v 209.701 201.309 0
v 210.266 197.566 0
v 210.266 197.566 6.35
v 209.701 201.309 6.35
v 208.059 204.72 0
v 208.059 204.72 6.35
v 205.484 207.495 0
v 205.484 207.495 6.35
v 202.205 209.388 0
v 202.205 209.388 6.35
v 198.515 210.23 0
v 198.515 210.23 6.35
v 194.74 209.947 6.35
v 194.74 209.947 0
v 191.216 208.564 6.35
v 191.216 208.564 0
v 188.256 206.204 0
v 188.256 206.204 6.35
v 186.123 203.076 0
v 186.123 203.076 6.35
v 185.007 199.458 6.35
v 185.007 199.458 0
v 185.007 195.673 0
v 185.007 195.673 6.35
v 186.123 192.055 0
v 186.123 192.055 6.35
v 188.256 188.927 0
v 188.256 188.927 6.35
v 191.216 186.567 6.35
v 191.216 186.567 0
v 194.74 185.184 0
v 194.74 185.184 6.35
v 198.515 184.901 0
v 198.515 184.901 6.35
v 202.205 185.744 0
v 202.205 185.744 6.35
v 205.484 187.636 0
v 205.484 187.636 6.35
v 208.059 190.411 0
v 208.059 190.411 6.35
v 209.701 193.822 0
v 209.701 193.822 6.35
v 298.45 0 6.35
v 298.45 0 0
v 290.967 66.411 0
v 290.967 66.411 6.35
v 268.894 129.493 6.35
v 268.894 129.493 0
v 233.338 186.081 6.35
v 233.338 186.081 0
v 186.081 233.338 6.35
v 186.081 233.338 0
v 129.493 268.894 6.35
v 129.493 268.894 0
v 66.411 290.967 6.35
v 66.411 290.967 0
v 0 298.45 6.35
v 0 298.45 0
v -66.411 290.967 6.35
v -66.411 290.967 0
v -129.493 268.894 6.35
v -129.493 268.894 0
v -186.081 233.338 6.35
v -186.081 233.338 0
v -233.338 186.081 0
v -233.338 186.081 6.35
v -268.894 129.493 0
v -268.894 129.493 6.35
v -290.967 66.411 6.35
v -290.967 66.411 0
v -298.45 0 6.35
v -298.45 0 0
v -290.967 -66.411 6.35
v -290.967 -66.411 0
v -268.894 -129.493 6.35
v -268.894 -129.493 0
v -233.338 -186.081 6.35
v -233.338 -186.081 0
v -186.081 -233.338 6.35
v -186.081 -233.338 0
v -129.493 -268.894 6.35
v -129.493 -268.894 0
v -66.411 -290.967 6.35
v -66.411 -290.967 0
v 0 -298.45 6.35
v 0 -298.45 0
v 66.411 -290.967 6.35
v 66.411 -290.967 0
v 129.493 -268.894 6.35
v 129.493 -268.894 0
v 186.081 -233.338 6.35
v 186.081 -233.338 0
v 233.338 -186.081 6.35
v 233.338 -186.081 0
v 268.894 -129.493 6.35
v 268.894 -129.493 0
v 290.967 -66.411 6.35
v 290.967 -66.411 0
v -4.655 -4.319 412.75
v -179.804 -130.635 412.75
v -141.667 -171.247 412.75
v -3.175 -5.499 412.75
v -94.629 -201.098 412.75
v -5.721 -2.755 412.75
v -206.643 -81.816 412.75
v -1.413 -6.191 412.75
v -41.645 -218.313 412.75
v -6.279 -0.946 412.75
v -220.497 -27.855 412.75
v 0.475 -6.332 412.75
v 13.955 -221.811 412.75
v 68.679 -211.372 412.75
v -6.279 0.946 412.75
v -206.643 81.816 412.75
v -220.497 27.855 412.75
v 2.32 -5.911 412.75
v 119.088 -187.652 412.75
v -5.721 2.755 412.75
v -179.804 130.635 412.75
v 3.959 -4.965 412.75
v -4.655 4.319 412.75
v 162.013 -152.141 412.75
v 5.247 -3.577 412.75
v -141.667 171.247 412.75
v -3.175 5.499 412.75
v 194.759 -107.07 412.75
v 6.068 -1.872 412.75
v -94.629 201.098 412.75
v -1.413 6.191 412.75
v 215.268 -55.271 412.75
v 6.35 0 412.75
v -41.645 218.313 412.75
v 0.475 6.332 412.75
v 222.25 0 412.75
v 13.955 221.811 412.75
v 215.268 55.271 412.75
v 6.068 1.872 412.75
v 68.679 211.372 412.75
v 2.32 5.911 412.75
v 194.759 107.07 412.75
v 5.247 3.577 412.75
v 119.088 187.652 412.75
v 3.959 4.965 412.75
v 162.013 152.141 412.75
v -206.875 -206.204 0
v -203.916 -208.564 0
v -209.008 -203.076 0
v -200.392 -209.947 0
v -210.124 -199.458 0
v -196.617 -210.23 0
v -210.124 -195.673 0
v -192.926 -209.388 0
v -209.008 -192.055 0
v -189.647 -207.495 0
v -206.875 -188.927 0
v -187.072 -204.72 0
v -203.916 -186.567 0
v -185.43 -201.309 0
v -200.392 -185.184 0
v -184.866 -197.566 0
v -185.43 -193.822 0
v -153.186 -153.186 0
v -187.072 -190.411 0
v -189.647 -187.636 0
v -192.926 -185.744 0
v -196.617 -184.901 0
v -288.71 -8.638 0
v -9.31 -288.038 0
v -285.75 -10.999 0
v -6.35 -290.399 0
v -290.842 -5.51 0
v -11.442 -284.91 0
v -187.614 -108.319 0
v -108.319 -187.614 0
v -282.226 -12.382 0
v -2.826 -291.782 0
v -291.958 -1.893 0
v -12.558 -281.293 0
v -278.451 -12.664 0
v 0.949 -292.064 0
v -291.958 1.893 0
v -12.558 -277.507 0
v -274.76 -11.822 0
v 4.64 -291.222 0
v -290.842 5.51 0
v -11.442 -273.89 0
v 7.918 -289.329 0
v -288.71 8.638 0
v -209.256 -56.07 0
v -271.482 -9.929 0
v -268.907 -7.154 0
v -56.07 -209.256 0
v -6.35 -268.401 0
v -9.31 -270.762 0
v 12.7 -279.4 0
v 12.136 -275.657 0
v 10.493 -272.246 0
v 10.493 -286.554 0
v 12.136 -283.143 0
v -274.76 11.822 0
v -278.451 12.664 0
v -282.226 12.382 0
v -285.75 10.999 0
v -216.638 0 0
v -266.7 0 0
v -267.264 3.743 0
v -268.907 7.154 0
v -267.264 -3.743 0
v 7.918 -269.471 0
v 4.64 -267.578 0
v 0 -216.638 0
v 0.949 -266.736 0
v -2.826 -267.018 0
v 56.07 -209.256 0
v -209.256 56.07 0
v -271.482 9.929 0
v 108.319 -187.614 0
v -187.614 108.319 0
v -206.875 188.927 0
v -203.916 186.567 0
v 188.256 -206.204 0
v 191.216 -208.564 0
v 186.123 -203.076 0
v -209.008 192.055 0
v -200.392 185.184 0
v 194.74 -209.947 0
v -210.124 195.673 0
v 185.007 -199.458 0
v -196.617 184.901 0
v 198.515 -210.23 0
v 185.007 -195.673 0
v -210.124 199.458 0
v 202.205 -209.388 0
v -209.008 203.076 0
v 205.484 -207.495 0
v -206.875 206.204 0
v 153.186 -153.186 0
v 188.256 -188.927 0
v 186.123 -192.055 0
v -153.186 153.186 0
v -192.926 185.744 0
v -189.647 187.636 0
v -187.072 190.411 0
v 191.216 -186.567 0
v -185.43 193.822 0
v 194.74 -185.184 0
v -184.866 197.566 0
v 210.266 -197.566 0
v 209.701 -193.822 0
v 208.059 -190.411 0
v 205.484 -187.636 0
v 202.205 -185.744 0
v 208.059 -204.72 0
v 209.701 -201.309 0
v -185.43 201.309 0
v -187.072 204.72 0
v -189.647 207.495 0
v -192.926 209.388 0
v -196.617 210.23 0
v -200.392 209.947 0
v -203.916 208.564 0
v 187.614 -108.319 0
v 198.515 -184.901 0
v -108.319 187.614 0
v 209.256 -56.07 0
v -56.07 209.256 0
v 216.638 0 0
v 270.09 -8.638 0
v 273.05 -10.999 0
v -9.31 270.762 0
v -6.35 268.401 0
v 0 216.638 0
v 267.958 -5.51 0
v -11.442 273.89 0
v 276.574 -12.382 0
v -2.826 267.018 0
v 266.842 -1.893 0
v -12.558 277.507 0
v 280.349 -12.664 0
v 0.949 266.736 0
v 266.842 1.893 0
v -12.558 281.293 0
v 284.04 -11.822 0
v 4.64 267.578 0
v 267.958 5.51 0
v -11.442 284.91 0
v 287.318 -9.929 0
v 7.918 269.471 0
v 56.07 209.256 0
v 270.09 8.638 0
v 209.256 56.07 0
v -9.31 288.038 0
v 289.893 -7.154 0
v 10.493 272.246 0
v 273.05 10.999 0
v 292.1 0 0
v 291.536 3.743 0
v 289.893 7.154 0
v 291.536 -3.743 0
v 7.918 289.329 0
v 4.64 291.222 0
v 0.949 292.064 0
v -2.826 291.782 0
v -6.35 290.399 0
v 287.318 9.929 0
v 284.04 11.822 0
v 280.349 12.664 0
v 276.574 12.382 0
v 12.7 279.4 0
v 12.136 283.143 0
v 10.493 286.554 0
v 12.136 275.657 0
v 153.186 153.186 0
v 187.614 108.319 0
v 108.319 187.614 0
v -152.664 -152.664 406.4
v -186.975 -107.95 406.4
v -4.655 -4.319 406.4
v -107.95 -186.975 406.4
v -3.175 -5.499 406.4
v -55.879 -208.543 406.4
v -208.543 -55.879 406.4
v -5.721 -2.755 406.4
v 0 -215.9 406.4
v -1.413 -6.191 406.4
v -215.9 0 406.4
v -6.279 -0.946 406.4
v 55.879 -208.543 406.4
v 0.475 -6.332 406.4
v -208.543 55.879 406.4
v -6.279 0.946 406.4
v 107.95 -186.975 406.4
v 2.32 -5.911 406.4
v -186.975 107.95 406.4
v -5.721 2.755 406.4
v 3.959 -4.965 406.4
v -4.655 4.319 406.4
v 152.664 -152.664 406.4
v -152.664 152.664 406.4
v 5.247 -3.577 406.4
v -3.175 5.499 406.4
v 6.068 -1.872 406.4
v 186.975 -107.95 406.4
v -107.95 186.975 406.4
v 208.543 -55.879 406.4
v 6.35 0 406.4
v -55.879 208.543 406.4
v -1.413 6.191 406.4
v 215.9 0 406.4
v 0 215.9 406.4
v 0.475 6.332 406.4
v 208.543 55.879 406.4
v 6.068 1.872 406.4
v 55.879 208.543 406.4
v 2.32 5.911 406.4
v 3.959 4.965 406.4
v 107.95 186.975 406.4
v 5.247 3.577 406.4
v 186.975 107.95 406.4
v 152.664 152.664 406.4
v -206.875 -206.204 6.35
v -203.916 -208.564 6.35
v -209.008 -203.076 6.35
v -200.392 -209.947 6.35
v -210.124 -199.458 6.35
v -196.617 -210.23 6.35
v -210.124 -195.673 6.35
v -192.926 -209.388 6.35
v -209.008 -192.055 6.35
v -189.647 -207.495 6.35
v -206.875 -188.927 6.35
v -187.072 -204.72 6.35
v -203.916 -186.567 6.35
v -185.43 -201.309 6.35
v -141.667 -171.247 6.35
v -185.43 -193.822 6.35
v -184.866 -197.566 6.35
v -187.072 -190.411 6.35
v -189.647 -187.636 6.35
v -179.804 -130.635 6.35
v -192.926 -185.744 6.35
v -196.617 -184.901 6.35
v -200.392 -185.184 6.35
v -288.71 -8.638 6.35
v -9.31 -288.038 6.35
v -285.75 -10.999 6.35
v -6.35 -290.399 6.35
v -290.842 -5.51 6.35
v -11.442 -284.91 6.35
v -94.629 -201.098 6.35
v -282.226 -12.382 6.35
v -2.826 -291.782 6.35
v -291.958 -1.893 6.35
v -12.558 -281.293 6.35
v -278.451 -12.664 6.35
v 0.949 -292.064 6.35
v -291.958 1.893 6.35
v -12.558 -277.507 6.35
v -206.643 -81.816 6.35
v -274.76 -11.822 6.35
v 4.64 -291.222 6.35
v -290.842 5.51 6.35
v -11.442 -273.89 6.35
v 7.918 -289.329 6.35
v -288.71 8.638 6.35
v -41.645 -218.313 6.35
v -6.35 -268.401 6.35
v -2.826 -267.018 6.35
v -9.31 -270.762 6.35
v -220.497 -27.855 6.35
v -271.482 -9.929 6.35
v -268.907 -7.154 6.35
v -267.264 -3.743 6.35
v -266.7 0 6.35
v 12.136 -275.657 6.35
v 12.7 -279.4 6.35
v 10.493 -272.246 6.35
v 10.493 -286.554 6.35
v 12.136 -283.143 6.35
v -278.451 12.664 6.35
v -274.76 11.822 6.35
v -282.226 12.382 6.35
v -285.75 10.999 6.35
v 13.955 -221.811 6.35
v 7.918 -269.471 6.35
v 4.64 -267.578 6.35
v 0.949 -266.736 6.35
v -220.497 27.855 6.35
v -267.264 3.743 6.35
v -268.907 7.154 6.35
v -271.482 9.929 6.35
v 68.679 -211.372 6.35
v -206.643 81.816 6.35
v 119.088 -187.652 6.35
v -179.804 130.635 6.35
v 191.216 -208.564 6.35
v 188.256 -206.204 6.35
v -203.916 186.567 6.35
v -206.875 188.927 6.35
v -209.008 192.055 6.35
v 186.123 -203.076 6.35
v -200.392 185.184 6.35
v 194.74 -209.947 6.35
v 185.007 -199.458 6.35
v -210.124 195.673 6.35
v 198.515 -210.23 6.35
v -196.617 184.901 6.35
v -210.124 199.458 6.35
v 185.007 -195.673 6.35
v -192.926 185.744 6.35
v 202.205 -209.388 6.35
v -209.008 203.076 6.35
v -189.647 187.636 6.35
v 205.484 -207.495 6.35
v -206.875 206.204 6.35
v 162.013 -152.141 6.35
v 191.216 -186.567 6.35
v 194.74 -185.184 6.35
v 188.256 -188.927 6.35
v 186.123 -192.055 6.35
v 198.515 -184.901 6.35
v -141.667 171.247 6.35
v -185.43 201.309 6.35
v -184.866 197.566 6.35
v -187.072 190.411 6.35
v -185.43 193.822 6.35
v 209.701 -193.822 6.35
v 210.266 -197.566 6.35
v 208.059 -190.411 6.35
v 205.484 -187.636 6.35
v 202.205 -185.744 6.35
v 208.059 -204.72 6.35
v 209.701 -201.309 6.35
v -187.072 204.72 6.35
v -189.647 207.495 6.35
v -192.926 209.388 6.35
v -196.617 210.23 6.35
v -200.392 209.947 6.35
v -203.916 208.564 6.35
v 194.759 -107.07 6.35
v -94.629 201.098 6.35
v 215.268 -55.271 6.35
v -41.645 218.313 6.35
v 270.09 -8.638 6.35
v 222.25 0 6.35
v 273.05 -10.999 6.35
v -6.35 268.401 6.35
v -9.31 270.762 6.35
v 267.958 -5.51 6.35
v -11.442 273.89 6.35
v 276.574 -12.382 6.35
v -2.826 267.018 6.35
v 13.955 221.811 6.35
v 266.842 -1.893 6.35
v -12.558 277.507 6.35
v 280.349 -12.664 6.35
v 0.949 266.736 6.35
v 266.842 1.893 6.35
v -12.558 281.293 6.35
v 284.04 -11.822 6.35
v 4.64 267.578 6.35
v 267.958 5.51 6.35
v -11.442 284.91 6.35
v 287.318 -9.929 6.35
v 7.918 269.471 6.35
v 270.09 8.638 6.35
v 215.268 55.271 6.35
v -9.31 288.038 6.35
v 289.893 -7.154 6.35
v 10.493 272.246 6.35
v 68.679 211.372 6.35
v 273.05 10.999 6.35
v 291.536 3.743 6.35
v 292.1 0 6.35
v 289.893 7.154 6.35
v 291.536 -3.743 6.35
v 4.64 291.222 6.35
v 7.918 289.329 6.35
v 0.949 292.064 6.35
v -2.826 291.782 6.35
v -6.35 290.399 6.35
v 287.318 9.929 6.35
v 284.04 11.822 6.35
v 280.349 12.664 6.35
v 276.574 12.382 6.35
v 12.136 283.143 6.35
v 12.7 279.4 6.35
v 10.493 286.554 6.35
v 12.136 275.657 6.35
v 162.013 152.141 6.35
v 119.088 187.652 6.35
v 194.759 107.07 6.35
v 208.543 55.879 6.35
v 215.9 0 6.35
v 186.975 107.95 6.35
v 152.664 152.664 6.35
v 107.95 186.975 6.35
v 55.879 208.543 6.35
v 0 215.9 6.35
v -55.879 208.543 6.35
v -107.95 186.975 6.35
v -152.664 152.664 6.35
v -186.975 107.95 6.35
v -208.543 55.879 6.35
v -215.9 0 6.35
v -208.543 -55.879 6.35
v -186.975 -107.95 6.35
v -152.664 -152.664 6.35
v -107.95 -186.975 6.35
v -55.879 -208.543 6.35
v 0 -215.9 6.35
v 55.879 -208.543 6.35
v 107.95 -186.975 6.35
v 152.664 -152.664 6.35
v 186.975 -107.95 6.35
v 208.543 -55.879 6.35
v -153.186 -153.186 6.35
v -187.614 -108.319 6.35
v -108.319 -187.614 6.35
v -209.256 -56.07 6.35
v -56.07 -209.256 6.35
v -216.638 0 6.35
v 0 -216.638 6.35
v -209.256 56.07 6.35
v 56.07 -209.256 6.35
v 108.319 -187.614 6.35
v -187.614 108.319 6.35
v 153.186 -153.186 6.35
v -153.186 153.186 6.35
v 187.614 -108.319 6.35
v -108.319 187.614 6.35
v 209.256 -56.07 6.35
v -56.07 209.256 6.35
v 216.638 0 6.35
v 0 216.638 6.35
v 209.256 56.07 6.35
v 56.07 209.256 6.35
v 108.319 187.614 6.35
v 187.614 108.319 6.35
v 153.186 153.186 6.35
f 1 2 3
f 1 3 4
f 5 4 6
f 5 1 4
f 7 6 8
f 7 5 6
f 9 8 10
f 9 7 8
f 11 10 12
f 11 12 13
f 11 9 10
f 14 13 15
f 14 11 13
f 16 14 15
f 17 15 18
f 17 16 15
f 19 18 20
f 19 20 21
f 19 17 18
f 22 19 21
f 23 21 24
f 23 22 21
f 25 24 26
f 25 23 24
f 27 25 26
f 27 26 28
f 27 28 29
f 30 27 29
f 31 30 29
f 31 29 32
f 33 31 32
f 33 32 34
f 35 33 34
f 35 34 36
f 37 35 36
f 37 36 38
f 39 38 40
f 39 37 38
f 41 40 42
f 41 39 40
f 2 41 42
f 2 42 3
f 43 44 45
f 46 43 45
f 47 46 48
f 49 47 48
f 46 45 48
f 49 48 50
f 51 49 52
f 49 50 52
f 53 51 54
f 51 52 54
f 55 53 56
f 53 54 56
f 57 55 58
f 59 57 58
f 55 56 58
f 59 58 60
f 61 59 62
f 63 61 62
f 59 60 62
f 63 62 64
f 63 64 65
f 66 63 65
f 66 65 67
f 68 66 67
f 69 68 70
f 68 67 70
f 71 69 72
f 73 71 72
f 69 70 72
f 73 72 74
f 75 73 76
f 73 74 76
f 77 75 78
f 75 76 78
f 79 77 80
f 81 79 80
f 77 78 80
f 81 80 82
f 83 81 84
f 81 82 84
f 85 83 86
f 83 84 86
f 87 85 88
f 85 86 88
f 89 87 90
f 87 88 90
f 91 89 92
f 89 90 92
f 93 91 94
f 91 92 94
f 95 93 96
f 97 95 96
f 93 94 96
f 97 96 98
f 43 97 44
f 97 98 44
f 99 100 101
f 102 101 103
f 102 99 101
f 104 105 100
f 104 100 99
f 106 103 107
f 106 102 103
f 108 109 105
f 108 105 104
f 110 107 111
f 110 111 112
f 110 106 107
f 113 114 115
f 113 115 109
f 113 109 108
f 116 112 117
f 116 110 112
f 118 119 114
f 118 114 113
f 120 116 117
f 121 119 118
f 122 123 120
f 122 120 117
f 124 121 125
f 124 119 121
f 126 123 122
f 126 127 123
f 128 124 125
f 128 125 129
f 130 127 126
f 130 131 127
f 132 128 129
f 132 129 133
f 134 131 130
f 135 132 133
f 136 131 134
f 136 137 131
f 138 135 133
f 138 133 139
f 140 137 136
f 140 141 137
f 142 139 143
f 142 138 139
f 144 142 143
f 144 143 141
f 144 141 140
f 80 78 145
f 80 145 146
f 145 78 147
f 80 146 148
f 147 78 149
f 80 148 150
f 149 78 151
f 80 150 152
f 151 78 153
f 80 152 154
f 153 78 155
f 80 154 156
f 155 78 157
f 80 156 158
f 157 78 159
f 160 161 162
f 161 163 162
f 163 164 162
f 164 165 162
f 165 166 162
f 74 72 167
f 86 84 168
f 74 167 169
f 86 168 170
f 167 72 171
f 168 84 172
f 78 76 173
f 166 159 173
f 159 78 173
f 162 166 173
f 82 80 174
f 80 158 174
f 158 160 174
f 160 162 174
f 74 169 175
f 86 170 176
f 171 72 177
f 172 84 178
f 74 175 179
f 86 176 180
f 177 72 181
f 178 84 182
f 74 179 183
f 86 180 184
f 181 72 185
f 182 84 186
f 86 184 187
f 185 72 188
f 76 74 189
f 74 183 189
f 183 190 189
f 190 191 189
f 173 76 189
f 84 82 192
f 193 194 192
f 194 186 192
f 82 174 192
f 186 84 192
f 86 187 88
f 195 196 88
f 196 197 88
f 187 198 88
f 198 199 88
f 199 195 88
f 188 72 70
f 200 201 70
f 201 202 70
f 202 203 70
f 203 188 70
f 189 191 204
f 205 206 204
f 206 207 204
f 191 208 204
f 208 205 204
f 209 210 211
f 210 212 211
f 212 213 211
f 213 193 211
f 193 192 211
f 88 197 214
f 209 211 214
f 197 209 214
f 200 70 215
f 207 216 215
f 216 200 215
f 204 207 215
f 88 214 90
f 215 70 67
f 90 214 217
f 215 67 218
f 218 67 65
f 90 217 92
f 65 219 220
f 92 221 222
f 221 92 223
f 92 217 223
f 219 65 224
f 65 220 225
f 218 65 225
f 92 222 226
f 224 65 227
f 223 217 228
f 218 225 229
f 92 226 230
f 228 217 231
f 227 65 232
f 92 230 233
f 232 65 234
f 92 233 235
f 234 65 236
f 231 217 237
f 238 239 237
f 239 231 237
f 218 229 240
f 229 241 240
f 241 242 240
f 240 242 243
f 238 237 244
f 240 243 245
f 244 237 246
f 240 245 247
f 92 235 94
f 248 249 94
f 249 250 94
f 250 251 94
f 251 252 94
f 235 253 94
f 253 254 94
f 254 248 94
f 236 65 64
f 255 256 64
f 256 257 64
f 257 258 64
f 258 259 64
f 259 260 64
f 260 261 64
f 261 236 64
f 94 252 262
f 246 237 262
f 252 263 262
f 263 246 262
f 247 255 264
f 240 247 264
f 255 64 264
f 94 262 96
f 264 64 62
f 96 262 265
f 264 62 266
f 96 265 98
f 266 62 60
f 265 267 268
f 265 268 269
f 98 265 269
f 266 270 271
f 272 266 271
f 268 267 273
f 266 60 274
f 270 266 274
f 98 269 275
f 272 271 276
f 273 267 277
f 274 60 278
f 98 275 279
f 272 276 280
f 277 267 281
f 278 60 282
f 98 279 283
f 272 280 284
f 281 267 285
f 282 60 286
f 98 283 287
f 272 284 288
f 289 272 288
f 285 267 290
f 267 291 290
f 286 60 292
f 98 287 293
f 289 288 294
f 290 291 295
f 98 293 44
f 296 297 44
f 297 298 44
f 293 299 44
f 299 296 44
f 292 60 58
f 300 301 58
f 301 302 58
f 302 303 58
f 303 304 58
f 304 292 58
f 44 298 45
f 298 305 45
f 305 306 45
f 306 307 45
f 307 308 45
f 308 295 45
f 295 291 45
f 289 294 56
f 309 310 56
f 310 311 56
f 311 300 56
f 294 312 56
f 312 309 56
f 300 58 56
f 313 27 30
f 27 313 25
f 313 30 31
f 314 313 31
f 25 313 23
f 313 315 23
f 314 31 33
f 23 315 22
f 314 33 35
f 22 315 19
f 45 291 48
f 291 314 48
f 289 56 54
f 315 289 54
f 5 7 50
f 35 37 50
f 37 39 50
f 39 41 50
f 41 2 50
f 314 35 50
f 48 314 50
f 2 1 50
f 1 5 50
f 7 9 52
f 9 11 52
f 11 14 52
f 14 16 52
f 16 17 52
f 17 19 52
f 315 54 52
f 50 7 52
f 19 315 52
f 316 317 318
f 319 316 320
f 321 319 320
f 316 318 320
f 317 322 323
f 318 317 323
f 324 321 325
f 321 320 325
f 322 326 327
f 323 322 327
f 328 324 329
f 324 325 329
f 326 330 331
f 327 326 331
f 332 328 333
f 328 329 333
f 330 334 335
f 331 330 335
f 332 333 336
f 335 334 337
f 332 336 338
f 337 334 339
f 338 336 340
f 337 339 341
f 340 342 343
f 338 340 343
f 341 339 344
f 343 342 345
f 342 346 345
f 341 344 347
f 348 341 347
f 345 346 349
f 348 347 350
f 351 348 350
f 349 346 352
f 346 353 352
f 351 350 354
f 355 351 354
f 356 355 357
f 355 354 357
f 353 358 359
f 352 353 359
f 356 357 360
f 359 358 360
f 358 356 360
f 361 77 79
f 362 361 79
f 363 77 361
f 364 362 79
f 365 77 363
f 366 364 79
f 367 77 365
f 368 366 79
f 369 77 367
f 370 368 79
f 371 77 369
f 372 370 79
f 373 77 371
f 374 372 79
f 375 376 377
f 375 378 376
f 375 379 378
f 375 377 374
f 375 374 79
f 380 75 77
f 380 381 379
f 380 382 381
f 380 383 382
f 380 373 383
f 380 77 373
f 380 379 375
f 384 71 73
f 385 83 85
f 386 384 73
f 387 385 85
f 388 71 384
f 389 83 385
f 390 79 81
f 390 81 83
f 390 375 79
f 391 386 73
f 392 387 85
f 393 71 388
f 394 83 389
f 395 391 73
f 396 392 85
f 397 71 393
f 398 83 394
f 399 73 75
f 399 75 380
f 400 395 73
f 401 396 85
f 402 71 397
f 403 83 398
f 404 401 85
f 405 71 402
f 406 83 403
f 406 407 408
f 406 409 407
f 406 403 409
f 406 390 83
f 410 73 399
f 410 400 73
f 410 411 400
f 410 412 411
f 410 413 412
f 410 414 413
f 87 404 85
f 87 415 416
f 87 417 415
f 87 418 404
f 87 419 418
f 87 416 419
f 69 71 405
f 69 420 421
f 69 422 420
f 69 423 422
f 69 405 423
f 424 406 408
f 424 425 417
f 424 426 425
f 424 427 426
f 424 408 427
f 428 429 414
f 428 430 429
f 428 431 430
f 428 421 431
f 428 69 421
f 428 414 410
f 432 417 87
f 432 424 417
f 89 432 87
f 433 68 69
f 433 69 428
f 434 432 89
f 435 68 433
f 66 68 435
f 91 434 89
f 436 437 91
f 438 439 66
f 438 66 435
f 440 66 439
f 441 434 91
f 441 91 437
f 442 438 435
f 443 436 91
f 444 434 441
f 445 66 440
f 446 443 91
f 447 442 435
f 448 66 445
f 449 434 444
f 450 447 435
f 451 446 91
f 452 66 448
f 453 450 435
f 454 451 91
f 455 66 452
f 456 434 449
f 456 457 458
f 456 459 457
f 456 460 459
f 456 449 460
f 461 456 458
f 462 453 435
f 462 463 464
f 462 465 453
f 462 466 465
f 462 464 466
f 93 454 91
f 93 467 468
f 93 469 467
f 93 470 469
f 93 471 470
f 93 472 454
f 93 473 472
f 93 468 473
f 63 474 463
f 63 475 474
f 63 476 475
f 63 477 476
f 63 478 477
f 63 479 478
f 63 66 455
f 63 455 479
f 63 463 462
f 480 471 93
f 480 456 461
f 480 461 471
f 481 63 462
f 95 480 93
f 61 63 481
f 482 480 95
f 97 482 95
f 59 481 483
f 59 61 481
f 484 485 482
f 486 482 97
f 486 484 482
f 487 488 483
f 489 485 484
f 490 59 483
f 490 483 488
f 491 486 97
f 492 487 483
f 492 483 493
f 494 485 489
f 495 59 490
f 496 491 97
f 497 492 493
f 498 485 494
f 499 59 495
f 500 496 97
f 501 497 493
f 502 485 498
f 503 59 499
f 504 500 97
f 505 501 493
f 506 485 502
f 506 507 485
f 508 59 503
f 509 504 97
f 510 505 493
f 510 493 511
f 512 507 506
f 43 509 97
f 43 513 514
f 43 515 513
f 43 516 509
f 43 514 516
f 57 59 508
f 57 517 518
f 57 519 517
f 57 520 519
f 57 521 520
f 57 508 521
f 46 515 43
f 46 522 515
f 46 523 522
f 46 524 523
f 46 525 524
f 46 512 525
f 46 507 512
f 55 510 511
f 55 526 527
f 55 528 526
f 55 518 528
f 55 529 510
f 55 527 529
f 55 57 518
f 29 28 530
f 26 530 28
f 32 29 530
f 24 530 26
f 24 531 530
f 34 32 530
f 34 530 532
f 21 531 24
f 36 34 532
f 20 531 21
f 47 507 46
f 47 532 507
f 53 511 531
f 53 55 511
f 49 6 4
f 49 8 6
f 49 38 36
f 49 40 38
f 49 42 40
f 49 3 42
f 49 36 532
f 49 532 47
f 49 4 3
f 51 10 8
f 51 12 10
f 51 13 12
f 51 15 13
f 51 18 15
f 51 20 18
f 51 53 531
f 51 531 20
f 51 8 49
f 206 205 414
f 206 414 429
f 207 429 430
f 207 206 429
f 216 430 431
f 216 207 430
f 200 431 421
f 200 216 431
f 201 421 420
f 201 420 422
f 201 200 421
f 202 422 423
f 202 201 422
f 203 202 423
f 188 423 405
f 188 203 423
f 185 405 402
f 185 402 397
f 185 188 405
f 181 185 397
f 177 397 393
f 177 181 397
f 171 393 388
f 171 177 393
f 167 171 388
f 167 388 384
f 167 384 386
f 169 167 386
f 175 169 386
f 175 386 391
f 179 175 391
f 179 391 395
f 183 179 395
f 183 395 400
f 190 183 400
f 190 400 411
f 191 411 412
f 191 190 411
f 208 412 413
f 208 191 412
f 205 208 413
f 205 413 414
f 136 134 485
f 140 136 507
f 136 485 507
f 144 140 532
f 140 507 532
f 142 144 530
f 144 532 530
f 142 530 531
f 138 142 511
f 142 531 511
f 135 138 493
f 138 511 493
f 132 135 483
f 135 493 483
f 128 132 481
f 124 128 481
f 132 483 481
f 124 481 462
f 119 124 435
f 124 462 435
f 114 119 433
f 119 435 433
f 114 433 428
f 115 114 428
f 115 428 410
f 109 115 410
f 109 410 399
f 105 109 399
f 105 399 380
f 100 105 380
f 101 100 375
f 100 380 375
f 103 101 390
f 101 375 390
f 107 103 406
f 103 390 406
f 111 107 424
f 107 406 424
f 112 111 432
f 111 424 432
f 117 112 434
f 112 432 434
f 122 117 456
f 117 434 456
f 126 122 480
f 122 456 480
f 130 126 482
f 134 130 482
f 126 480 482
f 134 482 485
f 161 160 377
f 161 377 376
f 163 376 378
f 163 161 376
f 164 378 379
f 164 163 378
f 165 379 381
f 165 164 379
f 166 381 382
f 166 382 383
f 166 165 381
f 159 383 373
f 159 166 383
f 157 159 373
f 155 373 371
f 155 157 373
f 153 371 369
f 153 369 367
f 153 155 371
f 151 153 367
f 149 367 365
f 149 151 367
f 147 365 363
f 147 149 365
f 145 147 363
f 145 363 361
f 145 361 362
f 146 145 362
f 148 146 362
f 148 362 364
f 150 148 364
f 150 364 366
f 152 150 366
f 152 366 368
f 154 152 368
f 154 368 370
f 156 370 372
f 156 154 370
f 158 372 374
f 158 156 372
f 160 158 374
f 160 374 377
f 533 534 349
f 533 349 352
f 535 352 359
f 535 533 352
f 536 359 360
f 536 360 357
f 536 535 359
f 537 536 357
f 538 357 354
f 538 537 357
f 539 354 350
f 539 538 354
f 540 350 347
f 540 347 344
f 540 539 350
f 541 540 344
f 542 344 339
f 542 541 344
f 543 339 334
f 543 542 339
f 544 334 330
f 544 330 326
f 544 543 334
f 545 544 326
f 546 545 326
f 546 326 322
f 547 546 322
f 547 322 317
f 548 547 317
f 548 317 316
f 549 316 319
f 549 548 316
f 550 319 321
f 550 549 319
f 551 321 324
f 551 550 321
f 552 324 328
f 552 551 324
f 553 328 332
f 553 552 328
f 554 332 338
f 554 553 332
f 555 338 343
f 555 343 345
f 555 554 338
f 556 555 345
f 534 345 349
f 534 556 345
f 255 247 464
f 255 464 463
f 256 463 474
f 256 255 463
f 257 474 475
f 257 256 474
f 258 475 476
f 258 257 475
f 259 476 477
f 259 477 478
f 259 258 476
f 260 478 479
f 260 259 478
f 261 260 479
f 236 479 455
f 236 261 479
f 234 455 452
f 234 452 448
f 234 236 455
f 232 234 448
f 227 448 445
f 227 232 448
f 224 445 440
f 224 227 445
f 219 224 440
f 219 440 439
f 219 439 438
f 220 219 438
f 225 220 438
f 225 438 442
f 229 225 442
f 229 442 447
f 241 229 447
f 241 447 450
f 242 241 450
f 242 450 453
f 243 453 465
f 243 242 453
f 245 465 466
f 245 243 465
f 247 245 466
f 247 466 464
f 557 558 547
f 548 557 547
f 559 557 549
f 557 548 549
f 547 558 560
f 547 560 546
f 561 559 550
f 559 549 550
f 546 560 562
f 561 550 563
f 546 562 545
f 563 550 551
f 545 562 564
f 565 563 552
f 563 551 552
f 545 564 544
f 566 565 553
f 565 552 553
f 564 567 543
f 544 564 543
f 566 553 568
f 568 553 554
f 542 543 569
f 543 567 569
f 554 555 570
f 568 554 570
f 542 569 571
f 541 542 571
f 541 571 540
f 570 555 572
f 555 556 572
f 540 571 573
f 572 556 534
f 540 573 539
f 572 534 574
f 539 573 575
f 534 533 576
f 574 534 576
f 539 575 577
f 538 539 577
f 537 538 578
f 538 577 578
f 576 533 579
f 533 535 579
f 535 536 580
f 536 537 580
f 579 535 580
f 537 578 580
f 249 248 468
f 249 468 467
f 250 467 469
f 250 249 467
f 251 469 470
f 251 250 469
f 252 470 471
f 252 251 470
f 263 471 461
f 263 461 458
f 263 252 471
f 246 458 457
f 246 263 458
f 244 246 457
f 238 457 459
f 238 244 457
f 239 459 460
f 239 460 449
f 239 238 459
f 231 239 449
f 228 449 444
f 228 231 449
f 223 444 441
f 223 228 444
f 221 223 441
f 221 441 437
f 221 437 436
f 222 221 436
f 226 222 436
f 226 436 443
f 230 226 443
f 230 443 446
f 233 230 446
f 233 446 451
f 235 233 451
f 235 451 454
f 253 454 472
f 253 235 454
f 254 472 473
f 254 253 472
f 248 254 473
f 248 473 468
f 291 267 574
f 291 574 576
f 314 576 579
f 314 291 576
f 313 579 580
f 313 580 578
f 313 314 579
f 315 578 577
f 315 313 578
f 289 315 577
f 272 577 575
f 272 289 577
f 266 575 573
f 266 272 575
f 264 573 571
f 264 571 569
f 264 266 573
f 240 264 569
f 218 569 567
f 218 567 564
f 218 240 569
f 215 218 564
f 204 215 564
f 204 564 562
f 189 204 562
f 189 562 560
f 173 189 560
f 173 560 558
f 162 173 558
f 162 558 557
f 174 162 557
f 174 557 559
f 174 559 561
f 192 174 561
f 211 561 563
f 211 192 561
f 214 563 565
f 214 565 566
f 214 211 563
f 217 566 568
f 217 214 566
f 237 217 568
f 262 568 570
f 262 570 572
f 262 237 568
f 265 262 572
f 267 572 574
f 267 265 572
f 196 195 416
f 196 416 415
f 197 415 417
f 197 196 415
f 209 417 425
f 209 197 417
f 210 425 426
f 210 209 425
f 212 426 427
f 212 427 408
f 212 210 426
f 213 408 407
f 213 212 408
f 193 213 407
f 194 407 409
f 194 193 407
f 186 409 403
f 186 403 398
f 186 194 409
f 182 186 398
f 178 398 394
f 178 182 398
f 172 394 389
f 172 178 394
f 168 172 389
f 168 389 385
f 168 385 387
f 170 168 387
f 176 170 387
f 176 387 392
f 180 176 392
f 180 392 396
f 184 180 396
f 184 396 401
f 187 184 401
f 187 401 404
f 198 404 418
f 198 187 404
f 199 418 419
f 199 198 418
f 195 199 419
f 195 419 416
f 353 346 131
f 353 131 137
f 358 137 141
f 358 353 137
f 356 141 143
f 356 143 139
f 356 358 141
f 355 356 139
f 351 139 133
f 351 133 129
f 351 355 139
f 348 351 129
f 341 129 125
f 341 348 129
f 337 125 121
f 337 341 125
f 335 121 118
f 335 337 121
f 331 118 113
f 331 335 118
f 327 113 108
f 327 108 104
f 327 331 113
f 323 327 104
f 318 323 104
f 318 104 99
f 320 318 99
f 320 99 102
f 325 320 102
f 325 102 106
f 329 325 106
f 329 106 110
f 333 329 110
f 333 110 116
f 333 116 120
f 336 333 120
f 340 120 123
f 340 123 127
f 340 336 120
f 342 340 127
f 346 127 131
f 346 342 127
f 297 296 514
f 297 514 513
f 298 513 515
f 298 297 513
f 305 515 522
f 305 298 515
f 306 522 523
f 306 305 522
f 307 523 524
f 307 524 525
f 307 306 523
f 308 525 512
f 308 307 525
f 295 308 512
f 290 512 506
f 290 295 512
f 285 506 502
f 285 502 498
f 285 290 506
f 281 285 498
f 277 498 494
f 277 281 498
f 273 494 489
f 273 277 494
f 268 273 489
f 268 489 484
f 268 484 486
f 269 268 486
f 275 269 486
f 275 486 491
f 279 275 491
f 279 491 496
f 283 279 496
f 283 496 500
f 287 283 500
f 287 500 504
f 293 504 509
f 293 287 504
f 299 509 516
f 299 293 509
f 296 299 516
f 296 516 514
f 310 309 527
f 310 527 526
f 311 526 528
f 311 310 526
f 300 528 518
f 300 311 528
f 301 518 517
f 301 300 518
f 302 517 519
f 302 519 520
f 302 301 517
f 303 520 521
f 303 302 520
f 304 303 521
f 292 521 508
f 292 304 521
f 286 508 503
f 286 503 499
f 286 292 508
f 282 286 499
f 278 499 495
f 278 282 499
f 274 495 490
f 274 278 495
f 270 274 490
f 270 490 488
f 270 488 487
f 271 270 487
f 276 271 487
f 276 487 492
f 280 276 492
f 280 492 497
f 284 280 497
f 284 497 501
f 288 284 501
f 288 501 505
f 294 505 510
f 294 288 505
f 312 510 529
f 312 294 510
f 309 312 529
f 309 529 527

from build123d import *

# Parameters (mm, degrees)
F0_R     = 298.45
F0_R_2   = 12.7
F0_R_3   = 216.637975
F1_DEPTH = 6.35
F3_R     = 222.25
F3_R_2   = 215.9
F4_DEPTH = 400.05
F6_R     = 222.25
F6_R_2   = 6.35
F7_DEPTH = 6.35


with BuildPart() as f1:
    # F0 (on Top) → F1 (new body)
    with BuildSketch(Plane.XY):
        Circle(F0_R)
        with Locations((-197.565635, -197.565635)):
            Circle(F0_R_2, mode=Mode.SUBTRACT)
        with Locations((0, -279.4)):
            Circle(F0_R_2, mode=Mode.SUBTRACT)
        with Locations((197.565635, -197.565635)):
            Circle(F0_R_2, mode=Mode.SUBTRACT)
        with Locations((-279.4, 0)):
            Circle(F0_R_2, mode=Mode.SUBTRACT)
        with Locations((-197.565635, 197.565635)):
            Circle(F0_R_2, mode=Mode.SUBTRACT)
        Circle(F0_R_3, mode=Mode.SUBTRACT)
        with Locations((279.4, 0)):
            Circle(F0_R_2, mode=Mode.SUBTRACT)
        with Locations((0, 279.4)):
            Circle(F0_R_2, mode=Mode.SUBTRACT)
        with Locations((197.565635, 197.565635)):
            Circle(F0_R_2, mode=Mode.SUBTRACT)
    extrude(amount=F1_DEPTH)

    # F3 (on offset) → F4 (join)
    with BuildSketch(Plane.XY.offset(6.35)):
        Circle(F3_R)
        Circle(F3_R_2, mode=Mode.SUBTRACT)
    extrude(amount=F4_DEPTH)

    # F6 (on offset) → F7 (join)
    with BuildSketch(Plane.XY.offset(406.4)):
        Circle(F6_R)
        Circle(F6_R_2, mode=Mode.SUBTRACT)
    extrude(amount=F7_DEPTH)


solid = f1.part
